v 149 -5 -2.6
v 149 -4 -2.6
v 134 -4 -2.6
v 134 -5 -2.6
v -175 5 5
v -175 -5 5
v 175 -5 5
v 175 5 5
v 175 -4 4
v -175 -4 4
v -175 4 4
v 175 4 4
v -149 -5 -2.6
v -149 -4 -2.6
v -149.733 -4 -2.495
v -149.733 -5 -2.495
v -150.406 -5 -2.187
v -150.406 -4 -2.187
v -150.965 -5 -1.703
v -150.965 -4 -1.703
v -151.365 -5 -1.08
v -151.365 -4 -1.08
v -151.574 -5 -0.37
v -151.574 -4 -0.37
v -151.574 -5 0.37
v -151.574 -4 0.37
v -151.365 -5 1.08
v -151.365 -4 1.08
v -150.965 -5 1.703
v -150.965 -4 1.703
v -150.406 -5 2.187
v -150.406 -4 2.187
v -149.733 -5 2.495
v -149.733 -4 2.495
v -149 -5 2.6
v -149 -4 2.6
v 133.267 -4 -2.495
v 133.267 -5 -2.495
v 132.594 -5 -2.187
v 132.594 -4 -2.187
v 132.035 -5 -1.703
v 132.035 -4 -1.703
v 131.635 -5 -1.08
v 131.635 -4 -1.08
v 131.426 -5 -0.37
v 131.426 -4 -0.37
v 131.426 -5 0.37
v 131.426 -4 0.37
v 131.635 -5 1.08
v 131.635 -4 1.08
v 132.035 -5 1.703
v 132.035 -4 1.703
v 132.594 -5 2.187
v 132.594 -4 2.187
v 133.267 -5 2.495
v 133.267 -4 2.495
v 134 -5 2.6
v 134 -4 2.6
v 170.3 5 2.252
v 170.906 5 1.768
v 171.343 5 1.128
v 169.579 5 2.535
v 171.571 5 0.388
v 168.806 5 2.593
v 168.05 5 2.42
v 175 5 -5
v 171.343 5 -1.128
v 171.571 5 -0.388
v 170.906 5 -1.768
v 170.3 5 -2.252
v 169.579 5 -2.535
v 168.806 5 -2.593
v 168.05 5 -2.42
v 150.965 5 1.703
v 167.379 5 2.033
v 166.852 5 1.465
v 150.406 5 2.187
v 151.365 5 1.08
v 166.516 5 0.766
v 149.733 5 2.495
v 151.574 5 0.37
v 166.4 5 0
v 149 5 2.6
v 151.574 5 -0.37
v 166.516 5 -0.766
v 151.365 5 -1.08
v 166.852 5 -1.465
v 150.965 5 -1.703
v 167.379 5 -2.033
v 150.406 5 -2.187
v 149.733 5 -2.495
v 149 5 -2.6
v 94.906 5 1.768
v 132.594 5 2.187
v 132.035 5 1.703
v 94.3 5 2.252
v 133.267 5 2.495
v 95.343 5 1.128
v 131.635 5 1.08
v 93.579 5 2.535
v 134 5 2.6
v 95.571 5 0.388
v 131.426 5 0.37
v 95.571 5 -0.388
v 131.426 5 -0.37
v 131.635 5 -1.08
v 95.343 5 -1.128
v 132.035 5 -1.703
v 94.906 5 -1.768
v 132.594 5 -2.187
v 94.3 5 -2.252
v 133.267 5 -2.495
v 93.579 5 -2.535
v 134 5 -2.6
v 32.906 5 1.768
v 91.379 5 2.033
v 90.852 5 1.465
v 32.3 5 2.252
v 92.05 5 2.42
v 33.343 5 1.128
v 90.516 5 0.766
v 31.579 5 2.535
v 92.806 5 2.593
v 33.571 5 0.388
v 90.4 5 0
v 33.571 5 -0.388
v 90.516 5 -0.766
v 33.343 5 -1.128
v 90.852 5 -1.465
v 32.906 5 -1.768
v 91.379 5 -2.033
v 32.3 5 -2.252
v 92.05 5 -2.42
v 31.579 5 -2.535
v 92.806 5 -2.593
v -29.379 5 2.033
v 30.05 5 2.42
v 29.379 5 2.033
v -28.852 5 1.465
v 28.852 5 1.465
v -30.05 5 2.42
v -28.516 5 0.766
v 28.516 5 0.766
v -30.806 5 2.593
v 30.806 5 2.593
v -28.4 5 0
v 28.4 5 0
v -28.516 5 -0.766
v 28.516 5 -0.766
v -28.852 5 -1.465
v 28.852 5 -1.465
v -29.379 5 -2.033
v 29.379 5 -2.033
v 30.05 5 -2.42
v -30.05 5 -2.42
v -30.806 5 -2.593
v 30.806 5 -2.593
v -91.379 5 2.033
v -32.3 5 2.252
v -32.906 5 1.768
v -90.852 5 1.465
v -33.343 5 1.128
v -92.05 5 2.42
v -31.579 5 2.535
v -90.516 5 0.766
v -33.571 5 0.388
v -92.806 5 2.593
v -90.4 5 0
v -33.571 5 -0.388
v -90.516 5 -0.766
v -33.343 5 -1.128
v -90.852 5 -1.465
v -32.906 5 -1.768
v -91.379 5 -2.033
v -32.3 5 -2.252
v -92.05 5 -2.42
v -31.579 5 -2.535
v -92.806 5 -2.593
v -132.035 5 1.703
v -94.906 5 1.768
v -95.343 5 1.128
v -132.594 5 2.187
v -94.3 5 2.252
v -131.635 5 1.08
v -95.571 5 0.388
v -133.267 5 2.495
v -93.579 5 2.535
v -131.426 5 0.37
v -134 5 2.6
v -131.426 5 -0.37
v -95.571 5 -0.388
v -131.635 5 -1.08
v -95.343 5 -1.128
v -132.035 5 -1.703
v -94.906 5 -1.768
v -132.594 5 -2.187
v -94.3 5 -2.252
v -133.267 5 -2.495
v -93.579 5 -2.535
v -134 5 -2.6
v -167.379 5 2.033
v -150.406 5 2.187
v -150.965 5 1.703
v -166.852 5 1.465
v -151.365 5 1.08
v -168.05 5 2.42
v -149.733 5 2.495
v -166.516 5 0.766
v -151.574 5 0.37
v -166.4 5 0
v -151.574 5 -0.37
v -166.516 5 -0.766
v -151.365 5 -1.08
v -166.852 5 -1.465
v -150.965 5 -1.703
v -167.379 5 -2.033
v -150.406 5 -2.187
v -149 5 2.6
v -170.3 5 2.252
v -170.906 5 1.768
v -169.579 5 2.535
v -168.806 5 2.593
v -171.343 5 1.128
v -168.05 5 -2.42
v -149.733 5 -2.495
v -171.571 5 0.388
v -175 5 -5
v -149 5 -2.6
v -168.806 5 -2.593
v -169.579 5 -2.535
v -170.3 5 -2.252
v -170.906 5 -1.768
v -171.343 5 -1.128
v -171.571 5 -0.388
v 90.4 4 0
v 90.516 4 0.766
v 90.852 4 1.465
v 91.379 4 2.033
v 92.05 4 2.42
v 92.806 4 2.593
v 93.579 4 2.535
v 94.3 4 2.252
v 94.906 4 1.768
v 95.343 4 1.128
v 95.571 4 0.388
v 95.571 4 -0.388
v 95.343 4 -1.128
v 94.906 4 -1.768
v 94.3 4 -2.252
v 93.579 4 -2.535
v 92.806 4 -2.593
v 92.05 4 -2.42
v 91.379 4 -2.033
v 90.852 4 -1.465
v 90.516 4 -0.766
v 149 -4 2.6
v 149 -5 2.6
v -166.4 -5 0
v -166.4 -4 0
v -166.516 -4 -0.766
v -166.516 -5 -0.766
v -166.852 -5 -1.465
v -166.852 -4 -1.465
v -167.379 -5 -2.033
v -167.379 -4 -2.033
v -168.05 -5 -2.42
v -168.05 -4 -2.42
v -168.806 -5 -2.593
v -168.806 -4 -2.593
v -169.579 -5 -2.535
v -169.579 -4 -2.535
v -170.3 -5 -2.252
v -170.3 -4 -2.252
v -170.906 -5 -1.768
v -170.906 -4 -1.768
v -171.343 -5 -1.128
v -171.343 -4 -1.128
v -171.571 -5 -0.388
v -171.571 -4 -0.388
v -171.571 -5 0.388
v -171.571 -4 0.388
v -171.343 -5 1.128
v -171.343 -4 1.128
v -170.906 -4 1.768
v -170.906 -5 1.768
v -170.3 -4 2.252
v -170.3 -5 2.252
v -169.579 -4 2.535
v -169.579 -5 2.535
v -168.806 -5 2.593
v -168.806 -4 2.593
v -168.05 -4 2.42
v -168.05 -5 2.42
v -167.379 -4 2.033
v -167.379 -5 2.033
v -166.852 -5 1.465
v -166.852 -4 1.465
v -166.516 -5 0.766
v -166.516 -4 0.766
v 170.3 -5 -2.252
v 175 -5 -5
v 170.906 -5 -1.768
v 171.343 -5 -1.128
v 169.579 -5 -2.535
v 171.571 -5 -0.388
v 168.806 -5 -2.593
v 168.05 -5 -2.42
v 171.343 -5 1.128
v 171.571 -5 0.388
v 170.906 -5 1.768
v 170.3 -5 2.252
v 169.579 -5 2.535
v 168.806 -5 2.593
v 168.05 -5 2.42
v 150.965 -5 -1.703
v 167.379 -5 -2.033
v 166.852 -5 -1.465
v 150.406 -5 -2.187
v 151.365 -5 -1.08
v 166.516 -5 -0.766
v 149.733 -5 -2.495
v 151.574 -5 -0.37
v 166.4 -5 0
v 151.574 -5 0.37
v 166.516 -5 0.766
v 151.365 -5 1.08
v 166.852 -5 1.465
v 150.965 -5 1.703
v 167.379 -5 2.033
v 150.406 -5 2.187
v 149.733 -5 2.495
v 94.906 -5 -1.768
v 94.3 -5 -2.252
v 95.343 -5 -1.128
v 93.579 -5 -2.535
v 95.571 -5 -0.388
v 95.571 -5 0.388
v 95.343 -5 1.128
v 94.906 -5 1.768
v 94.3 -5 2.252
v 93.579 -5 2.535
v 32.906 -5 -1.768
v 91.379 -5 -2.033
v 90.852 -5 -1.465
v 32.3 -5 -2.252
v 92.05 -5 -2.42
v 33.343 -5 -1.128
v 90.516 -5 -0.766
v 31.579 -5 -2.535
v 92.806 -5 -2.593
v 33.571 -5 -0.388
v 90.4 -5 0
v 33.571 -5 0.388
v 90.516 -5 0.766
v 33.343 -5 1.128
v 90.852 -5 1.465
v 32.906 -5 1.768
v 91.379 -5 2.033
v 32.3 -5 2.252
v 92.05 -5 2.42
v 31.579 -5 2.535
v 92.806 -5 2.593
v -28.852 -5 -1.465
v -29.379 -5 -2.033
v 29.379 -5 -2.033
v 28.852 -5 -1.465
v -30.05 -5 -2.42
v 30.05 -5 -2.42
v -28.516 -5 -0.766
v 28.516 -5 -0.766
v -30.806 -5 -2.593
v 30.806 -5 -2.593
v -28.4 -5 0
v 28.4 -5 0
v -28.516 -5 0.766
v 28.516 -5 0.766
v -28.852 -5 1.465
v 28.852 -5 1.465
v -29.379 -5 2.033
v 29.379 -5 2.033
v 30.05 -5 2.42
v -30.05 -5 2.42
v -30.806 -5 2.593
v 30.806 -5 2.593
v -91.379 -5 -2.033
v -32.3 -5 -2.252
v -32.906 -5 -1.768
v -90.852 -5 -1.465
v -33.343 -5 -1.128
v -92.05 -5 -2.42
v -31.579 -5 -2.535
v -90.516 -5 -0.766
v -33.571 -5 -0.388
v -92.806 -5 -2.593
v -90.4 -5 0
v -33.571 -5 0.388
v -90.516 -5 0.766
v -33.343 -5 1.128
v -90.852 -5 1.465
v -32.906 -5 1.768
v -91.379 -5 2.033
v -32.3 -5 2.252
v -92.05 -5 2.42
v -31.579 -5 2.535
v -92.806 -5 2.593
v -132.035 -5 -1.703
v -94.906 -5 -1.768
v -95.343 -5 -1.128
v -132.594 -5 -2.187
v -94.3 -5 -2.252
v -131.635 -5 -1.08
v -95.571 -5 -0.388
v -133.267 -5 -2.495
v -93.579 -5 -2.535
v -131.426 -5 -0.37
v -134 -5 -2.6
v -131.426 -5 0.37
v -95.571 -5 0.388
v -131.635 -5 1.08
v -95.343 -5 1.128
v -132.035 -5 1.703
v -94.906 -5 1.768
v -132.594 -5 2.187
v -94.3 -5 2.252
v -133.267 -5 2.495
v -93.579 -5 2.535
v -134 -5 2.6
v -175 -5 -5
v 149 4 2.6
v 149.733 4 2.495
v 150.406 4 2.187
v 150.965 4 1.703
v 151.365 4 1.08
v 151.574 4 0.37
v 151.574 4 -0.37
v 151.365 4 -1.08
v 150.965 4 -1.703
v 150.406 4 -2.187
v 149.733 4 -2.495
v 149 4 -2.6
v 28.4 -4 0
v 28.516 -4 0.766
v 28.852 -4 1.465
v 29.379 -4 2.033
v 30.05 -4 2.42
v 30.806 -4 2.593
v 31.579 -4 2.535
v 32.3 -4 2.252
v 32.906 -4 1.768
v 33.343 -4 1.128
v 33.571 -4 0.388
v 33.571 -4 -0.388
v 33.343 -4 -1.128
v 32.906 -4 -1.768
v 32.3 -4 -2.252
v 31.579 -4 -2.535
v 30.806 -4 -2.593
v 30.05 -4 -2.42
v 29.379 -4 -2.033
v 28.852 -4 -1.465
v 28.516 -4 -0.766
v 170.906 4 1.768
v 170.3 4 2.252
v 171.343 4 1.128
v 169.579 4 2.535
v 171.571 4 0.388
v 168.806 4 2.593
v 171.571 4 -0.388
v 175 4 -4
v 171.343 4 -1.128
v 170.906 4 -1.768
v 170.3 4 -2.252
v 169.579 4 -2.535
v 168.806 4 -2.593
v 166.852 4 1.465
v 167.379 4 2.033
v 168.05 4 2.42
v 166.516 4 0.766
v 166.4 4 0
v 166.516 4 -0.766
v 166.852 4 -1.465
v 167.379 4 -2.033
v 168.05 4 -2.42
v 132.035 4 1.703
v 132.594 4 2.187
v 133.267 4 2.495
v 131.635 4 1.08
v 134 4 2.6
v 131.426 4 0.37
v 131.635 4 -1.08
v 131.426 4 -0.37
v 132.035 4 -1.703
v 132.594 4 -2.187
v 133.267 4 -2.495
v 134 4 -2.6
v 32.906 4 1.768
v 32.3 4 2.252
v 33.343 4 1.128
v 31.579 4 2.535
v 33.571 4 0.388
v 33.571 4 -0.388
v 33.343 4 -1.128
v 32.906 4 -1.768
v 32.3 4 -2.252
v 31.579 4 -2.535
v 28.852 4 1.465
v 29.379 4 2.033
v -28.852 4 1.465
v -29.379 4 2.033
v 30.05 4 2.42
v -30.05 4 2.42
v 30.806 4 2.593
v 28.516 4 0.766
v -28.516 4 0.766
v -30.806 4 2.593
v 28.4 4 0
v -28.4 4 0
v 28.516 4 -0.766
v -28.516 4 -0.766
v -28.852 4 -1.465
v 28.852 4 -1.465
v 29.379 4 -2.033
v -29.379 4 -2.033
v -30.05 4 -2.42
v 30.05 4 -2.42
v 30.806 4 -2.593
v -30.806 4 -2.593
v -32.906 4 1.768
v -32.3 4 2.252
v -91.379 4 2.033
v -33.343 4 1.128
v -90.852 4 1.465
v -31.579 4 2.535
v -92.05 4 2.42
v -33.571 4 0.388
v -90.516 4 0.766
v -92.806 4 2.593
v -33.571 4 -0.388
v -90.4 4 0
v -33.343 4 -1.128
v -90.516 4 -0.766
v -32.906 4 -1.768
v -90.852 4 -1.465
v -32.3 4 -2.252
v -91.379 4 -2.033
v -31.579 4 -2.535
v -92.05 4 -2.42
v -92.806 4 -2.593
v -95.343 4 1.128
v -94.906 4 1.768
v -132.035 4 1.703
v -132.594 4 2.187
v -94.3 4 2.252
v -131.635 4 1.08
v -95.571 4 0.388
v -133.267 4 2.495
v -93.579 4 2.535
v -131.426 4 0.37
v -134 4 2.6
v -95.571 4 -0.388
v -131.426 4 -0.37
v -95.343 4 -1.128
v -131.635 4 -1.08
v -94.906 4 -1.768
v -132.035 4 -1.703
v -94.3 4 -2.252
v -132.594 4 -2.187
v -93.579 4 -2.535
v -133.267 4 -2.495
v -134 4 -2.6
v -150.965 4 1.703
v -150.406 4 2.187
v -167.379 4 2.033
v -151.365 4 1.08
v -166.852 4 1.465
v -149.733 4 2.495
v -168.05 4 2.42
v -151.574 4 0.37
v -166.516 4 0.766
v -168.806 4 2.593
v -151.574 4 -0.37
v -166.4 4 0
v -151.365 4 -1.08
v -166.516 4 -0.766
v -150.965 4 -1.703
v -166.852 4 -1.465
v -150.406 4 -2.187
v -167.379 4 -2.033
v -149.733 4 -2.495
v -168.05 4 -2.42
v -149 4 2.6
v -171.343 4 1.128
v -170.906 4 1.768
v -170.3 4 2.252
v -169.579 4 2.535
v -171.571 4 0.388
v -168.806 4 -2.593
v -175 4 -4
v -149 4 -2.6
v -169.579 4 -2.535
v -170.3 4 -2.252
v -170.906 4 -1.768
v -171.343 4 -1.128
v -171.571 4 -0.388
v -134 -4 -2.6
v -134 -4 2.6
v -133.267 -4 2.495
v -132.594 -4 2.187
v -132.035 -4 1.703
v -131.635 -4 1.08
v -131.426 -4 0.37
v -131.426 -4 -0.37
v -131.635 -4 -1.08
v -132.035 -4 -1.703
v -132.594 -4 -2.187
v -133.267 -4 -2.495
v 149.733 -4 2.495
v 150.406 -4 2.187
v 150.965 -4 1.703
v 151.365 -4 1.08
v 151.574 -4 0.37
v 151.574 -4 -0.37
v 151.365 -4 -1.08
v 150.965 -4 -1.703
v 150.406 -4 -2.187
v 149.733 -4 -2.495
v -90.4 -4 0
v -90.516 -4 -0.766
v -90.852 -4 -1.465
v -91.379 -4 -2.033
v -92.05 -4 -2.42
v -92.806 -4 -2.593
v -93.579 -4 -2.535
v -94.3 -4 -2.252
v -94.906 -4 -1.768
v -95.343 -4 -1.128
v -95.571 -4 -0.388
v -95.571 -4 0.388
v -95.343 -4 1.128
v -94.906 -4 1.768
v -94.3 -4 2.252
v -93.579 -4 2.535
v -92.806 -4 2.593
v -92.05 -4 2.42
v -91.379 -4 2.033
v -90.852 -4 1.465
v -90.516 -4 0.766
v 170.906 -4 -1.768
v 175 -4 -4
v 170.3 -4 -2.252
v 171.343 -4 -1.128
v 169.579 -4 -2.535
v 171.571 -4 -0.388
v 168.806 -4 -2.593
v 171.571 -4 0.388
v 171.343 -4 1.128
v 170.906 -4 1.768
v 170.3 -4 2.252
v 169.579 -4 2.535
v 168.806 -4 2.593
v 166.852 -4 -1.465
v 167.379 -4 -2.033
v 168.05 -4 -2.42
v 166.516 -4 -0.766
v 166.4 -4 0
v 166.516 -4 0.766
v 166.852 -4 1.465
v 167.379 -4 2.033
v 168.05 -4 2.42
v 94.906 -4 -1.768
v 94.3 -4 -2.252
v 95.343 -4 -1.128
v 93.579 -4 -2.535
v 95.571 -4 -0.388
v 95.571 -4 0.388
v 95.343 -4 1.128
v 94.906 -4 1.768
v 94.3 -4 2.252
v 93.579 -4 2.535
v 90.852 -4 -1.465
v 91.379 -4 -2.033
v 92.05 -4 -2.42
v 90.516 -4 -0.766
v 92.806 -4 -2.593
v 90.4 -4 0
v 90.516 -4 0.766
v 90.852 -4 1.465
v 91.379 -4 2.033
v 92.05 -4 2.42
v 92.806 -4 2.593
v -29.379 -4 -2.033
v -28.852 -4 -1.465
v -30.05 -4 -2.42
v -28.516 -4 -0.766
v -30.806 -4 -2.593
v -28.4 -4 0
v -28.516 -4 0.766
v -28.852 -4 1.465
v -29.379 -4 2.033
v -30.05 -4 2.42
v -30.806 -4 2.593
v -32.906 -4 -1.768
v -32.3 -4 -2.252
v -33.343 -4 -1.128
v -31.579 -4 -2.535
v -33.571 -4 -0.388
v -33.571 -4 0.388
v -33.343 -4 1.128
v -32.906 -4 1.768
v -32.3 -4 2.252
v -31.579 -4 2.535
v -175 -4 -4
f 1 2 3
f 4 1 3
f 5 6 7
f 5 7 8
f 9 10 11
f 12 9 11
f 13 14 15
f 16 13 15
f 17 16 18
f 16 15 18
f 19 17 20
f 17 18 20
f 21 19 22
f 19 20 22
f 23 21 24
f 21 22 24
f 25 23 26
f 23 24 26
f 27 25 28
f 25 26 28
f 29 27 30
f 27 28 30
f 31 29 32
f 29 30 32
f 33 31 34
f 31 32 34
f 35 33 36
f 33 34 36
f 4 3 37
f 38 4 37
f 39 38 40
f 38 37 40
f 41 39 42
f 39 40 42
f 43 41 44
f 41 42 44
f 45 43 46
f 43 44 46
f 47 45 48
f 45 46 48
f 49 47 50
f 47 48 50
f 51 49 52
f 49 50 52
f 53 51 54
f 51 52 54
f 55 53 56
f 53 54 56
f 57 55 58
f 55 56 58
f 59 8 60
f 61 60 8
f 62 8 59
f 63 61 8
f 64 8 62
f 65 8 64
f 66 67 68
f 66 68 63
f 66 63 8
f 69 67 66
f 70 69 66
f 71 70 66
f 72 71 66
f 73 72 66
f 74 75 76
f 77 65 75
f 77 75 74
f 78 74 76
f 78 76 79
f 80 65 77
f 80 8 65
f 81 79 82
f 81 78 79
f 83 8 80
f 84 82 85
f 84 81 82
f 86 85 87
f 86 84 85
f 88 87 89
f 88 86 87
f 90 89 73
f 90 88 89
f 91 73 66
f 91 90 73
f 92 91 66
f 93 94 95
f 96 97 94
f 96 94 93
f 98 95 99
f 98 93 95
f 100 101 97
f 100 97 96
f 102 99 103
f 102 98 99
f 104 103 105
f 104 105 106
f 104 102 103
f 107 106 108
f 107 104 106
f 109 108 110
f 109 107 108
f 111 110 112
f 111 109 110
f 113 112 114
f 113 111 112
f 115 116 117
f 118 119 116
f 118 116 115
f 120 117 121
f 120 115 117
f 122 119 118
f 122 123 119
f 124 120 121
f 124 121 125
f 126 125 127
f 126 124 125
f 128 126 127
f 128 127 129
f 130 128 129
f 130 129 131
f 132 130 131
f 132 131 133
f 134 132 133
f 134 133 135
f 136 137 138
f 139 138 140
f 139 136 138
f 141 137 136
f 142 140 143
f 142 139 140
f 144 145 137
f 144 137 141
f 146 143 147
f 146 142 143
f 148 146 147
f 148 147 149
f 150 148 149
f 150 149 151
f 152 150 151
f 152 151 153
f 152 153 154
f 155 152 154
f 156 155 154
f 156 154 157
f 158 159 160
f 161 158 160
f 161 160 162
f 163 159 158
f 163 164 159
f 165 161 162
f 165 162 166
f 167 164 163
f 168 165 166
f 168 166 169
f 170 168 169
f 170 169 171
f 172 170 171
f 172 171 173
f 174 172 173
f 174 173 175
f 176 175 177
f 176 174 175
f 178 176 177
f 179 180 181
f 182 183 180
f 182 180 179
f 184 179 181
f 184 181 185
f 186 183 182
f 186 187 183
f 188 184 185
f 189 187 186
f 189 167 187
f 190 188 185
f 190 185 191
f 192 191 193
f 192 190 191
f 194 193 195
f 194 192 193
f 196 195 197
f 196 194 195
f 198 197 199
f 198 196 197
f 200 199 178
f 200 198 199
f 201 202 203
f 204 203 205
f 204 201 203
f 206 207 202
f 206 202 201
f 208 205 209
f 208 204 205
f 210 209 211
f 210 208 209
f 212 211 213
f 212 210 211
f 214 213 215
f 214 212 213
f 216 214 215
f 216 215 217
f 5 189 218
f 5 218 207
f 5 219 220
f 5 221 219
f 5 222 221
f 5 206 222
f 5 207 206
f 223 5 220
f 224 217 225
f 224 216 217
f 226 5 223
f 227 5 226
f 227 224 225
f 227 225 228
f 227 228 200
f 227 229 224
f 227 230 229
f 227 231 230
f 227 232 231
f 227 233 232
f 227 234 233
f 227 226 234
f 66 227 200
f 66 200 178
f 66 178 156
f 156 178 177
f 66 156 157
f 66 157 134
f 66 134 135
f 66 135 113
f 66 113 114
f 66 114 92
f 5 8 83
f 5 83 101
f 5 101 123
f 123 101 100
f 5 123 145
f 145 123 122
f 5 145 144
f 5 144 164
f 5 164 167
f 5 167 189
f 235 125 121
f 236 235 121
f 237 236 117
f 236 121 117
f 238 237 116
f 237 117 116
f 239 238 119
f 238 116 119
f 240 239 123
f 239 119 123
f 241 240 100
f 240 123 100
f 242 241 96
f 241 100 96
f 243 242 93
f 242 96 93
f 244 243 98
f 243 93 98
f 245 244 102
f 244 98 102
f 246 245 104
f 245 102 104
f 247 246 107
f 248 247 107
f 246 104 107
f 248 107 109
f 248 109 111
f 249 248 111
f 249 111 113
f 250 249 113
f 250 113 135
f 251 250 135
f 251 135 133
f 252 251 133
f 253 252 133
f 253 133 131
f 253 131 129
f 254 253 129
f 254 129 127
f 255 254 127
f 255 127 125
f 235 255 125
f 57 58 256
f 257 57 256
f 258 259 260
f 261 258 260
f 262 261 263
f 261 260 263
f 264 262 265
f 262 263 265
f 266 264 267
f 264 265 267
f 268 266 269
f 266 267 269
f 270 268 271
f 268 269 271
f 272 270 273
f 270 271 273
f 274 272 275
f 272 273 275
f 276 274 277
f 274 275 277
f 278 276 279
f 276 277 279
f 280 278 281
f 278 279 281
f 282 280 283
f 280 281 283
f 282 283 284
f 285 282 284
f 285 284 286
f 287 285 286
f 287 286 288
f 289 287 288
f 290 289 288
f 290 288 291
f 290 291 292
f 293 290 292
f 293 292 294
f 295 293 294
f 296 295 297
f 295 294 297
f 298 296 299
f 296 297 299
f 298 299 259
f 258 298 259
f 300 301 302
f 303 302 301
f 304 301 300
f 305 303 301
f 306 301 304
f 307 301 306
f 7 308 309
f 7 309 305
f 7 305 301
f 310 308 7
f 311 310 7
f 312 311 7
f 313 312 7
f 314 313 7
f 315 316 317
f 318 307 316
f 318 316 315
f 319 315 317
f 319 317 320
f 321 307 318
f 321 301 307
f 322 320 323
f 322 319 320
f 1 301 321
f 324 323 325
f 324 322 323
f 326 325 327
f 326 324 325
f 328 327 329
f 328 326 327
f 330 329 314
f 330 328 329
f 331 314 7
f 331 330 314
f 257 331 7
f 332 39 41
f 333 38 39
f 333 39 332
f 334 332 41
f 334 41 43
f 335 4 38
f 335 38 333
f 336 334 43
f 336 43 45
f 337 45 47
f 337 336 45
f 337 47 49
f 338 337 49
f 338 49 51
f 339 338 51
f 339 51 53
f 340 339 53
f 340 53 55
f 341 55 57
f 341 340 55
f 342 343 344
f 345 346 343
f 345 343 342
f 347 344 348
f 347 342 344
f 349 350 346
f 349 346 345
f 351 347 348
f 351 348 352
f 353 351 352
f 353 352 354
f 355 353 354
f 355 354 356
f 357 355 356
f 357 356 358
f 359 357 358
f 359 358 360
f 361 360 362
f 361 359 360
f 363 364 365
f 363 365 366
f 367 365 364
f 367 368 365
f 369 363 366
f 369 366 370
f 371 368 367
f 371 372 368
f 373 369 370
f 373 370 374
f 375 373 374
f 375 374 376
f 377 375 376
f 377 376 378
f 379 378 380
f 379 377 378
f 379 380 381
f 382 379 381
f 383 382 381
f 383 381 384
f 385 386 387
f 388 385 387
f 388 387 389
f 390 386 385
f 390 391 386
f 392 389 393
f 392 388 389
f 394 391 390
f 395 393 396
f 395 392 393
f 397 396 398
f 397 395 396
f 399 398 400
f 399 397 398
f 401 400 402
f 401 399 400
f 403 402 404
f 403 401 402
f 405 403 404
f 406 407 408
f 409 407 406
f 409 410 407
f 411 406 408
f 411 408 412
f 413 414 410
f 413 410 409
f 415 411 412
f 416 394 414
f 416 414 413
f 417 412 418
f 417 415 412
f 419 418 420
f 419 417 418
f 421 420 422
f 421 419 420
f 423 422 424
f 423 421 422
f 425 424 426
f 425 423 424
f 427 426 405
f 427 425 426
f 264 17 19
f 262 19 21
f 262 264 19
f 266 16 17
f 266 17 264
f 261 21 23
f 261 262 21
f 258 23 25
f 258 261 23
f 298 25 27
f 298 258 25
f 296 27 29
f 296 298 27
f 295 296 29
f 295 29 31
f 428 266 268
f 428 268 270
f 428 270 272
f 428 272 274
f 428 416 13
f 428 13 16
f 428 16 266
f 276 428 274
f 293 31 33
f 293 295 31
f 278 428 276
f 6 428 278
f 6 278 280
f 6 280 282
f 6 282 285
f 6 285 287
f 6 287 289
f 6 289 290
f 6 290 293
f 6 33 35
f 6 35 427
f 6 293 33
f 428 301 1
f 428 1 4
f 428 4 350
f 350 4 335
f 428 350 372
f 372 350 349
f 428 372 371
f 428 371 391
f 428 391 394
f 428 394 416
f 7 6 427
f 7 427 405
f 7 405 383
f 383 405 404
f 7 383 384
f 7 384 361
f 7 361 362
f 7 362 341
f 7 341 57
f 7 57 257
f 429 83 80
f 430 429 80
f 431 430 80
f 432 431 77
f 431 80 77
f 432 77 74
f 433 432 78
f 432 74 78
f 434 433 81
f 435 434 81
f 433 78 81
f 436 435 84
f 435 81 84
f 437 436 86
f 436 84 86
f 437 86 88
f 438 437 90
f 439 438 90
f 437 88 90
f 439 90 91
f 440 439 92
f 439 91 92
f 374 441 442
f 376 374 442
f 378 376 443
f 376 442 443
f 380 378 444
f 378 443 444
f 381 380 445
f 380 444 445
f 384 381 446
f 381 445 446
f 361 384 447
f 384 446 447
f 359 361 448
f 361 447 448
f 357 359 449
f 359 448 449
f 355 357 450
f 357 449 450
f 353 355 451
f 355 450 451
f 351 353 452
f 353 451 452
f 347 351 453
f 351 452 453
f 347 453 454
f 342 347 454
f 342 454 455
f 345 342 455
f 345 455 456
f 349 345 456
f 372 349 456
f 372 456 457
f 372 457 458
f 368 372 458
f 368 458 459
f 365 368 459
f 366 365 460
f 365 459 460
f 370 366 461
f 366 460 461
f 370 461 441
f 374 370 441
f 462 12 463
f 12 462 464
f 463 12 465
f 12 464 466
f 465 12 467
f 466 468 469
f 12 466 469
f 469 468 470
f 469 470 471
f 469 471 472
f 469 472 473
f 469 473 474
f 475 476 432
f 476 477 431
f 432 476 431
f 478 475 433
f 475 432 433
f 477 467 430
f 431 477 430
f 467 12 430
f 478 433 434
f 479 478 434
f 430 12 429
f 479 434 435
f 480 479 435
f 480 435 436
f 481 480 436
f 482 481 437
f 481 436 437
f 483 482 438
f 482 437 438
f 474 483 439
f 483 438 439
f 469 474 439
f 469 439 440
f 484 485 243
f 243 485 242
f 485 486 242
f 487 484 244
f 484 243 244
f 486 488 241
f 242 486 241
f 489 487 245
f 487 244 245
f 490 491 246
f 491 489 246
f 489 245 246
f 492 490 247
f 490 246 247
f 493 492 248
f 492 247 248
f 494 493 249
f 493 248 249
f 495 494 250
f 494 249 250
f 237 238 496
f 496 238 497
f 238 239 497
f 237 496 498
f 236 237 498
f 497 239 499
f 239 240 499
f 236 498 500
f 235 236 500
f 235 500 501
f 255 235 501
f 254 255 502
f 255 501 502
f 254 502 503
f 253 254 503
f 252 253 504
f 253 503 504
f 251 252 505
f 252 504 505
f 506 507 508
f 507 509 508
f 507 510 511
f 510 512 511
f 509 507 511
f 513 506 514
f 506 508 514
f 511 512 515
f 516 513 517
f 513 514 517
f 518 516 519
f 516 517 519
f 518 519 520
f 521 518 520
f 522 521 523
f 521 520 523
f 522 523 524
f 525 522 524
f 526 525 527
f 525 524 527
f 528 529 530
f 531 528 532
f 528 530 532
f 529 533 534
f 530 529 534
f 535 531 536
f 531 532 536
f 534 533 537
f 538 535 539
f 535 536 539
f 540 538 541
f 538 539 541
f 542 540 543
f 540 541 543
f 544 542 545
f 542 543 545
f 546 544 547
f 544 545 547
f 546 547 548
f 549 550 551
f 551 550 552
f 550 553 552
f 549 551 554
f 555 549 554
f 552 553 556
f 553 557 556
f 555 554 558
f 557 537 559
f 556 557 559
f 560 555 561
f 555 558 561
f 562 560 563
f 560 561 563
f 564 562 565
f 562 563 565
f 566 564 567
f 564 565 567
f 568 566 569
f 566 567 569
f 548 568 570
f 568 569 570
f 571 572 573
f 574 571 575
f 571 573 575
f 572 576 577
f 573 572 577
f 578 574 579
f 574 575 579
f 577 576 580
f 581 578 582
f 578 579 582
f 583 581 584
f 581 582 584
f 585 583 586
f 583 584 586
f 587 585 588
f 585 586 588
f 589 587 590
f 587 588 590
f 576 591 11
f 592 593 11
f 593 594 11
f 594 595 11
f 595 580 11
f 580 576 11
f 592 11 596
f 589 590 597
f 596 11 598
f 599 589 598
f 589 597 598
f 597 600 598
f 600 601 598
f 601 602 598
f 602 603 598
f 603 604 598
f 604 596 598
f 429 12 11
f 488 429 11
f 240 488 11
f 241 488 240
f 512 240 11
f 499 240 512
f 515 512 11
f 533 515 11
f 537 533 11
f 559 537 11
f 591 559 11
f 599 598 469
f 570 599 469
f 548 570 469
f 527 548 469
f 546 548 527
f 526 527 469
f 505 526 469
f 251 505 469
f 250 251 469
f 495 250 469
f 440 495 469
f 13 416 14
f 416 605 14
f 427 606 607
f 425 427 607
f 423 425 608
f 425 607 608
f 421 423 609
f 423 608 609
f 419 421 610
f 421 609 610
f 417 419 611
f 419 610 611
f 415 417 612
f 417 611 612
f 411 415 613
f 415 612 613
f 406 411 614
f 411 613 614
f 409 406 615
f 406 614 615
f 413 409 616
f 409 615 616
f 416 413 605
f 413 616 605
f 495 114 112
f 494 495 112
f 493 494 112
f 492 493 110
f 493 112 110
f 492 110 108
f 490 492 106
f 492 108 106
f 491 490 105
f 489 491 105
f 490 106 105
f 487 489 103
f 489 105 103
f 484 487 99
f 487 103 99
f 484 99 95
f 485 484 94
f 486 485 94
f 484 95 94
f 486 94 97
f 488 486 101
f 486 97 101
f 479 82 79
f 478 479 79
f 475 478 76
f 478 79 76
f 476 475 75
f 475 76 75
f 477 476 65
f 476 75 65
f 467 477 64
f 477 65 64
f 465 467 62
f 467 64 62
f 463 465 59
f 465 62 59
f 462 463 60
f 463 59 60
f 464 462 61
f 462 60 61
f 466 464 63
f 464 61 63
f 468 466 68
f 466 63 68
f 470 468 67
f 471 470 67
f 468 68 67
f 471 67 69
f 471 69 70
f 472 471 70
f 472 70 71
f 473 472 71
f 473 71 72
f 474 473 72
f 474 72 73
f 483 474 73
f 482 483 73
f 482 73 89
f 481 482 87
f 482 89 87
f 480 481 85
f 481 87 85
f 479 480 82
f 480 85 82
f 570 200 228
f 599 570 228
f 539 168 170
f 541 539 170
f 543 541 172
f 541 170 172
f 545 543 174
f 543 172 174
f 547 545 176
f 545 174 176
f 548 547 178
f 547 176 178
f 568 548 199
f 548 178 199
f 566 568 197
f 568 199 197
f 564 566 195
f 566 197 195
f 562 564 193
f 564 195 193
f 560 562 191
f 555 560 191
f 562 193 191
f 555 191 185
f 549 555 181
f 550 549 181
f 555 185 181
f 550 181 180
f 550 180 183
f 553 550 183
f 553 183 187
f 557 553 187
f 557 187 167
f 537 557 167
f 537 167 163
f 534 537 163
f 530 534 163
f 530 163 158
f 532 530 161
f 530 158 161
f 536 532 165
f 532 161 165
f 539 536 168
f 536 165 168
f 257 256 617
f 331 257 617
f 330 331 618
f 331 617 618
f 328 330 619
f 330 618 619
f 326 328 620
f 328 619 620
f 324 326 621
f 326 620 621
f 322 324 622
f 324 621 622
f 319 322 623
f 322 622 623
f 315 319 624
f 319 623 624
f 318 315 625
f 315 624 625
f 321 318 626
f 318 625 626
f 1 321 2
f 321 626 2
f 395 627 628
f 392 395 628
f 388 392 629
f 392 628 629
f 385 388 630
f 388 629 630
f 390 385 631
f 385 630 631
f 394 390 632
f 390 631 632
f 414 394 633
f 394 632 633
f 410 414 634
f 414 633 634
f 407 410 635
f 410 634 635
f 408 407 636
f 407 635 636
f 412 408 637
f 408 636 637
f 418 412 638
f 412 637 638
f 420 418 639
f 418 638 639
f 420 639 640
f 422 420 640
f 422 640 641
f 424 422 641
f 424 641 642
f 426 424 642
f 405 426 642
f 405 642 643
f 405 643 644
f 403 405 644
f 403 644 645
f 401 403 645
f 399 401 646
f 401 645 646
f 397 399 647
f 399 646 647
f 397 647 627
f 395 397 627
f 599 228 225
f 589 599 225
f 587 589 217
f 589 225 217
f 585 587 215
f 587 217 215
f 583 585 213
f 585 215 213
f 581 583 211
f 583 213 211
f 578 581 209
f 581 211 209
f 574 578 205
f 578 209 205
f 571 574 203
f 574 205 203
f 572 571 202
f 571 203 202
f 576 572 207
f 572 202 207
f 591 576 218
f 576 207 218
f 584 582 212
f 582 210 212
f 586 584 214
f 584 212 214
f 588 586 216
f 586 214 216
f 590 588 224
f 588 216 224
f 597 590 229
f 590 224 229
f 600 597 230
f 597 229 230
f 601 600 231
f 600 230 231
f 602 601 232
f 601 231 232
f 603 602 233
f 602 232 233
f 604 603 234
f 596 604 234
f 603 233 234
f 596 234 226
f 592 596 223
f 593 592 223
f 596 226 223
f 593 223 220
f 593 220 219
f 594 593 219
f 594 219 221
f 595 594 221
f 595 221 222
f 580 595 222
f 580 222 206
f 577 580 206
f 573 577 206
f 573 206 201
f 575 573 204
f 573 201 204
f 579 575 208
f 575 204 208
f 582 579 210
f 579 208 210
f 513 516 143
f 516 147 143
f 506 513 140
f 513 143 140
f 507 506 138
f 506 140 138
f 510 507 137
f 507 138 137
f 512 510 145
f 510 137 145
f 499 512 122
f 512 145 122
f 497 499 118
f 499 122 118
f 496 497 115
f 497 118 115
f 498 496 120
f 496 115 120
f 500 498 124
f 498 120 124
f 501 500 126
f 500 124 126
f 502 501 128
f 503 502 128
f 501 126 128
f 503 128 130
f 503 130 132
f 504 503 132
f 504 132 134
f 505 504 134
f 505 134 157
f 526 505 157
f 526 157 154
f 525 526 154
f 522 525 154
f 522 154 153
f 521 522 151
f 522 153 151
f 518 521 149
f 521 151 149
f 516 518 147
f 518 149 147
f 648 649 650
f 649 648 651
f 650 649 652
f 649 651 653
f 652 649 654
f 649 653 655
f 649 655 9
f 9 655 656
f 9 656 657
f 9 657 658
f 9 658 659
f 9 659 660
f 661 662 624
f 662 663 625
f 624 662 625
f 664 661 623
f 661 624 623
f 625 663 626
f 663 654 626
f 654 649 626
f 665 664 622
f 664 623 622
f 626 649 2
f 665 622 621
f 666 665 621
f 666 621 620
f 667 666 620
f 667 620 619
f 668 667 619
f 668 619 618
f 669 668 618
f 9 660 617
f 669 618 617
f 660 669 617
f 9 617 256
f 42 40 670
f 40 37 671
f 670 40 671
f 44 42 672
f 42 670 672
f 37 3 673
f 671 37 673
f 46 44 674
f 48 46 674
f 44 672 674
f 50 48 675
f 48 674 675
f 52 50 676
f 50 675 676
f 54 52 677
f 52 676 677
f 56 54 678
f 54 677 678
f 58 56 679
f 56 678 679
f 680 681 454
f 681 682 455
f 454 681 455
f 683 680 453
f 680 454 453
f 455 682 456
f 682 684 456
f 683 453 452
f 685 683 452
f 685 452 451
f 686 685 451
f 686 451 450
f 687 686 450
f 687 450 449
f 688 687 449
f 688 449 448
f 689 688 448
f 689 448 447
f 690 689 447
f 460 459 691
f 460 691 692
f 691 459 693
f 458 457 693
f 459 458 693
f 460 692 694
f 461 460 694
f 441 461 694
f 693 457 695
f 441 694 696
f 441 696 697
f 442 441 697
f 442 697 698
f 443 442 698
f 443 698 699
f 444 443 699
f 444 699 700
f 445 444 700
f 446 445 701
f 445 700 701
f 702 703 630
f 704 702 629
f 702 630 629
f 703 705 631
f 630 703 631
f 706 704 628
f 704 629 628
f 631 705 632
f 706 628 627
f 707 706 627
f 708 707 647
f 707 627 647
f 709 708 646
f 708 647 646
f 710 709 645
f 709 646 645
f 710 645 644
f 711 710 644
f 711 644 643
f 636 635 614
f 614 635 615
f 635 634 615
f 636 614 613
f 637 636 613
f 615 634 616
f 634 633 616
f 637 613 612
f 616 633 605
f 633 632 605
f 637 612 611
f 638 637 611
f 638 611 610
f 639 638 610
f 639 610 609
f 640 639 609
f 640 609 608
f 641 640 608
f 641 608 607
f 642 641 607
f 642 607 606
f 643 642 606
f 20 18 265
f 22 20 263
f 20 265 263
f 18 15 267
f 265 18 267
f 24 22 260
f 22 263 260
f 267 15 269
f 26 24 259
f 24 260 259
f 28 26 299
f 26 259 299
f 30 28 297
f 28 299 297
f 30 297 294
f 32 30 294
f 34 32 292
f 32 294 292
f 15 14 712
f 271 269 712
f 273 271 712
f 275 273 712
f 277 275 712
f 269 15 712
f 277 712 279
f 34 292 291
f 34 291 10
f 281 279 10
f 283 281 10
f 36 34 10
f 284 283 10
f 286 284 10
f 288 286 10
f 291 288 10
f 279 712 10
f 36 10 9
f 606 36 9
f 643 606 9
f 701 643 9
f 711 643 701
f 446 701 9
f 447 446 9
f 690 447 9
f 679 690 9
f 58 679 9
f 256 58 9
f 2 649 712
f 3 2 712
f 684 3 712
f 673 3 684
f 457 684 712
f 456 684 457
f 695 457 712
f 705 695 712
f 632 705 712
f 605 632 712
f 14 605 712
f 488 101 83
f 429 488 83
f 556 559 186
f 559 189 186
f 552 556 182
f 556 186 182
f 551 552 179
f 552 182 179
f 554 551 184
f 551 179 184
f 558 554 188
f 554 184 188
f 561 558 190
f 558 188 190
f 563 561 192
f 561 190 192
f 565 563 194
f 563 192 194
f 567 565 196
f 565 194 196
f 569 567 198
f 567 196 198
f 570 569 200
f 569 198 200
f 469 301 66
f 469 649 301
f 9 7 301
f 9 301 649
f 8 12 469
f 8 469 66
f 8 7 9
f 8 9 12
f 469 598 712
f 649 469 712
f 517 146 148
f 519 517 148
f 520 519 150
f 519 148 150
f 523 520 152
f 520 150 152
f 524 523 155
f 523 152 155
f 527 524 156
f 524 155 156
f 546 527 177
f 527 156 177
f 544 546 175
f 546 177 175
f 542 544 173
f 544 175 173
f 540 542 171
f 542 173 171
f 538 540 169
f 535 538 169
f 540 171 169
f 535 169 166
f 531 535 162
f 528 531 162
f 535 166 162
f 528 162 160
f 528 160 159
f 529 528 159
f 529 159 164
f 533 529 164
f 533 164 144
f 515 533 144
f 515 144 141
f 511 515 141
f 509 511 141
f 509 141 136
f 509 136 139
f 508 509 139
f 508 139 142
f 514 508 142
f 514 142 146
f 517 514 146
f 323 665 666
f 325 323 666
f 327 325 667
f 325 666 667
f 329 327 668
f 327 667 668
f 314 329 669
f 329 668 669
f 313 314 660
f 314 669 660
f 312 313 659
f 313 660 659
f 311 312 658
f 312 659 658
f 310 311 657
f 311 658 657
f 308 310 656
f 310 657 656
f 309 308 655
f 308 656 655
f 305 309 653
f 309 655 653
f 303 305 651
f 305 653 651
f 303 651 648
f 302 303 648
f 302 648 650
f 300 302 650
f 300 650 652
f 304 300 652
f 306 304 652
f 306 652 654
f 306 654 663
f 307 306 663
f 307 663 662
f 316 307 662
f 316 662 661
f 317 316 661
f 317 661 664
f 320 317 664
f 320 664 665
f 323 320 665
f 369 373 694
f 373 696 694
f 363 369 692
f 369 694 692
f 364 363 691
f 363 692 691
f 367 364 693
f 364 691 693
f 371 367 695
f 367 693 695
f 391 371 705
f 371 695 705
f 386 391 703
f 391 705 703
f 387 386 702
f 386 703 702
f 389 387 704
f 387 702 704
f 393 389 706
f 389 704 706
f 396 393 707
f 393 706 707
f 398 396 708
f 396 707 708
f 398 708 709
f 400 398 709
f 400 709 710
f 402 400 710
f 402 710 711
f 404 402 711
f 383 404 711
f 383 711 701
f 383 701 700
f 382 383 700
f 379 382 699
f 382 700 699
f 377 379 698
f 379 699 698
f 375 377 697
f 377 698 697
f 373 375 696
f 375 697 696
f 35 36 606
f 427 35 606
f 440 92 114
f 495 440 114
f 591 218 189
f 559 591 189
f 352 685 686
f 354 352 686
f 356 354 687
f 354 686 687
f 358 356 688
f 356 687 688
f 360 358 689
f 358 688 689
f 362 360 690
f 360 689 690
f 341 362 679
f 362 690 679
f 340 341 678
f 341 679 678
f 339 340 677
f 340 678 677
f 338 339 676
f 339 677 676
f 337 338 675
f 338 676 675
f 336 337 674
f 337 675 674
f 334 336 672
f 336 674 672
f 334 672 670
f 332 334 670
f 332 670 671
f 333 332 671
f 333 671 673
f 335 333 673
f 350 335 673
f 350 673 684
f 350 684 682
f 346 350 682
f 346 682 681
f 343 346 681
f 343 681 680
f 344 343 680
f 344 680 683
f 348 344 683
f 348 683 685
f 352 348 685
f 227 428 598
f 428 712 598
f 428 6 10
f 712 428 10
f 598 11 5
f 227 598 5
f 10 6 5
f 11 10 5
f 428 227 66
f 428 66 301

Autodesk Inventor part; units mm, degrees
ref_plane "XZ Plane" through (0, 0, 0) normal (0, 1, 0) x (-1, 0, 0)
ref_plane "XY Plane" through (0, 0, 0) normal (0, 0, 1) x (1, 0, 0)
sketch "Sketch1" plane through (0, 0, 0) normal (1, 0, 0) x (0, 1, 0)
  line L0 (-5, 5) -> (5, 5)
  line L1 (5, 5) -> (5, -5)
  line L2 (5, -5) -> (-5, -5)
  line L3 (-5, -5) -> (-5, 5)
  line L4 (-5, 5) -> (5, -5) construction
  line L5 (5, 5) -> (-5, -5) construction
  line L6 (-4, 4) -> (4, 4)
  line L7 (4, 4) -> (4, -4)
  line L8 (4, -4) -> (-4, -4)
  line L9 (-4, -4) -> (-4, 4)
  line L10 (-4, 4) -> (4, -4) construction
  line L11 (4, 4) -> (-4, -4) construction
  point P0 (0, 0)
  dimension "d0" = 10
  dimension "d1" = 10
  dimension "d2" = 8
  dimension "d3" = 8
extrude "Extrusion1" add sketch "Sketch1" along normal mid plane 350
sketch "Sketch2" plane through (-175, 5, 5) normal (0, 1, 0) x (1, 0, 0)
  circle A0 centre (6, 5) radius 2.6
  line L0 (26, 5) -> (41, 5) construction
  line L1 (26, 2.4) -> (41, 2.4)
  line L2 (41, 7.6) -> (26, 7.6)
  arc A1 (26, 7.6) -> (26, 2.4) centre (26, 5) ccw
  arc A2 (41, 2.4) -> (41, 7.6) centre (41, 5) ccw
  line L3 (0, 0) -> (0, 10) projected
  circle A3 centre (82, 5) radius 2.6
  circle A4 centre (144, 5) radius 2.6
  point P0 (175, 5)
  point P1 (33.5, 5)
  dimension "d6" = 5.2
  dimension "d7" = 6
  dimension "d8" = 20
  dimension "d9" = 15
  dimension "d13" = 62
  dimension "d14" = 31
extrude "Extrusion2" cut sketch "Sketch2" against normal blind 100
mirror "Mirror1" about plane through (0, 0, 0) normal (1, 0, 0) of "Extrusion2"
properties part number "holder_bar"
